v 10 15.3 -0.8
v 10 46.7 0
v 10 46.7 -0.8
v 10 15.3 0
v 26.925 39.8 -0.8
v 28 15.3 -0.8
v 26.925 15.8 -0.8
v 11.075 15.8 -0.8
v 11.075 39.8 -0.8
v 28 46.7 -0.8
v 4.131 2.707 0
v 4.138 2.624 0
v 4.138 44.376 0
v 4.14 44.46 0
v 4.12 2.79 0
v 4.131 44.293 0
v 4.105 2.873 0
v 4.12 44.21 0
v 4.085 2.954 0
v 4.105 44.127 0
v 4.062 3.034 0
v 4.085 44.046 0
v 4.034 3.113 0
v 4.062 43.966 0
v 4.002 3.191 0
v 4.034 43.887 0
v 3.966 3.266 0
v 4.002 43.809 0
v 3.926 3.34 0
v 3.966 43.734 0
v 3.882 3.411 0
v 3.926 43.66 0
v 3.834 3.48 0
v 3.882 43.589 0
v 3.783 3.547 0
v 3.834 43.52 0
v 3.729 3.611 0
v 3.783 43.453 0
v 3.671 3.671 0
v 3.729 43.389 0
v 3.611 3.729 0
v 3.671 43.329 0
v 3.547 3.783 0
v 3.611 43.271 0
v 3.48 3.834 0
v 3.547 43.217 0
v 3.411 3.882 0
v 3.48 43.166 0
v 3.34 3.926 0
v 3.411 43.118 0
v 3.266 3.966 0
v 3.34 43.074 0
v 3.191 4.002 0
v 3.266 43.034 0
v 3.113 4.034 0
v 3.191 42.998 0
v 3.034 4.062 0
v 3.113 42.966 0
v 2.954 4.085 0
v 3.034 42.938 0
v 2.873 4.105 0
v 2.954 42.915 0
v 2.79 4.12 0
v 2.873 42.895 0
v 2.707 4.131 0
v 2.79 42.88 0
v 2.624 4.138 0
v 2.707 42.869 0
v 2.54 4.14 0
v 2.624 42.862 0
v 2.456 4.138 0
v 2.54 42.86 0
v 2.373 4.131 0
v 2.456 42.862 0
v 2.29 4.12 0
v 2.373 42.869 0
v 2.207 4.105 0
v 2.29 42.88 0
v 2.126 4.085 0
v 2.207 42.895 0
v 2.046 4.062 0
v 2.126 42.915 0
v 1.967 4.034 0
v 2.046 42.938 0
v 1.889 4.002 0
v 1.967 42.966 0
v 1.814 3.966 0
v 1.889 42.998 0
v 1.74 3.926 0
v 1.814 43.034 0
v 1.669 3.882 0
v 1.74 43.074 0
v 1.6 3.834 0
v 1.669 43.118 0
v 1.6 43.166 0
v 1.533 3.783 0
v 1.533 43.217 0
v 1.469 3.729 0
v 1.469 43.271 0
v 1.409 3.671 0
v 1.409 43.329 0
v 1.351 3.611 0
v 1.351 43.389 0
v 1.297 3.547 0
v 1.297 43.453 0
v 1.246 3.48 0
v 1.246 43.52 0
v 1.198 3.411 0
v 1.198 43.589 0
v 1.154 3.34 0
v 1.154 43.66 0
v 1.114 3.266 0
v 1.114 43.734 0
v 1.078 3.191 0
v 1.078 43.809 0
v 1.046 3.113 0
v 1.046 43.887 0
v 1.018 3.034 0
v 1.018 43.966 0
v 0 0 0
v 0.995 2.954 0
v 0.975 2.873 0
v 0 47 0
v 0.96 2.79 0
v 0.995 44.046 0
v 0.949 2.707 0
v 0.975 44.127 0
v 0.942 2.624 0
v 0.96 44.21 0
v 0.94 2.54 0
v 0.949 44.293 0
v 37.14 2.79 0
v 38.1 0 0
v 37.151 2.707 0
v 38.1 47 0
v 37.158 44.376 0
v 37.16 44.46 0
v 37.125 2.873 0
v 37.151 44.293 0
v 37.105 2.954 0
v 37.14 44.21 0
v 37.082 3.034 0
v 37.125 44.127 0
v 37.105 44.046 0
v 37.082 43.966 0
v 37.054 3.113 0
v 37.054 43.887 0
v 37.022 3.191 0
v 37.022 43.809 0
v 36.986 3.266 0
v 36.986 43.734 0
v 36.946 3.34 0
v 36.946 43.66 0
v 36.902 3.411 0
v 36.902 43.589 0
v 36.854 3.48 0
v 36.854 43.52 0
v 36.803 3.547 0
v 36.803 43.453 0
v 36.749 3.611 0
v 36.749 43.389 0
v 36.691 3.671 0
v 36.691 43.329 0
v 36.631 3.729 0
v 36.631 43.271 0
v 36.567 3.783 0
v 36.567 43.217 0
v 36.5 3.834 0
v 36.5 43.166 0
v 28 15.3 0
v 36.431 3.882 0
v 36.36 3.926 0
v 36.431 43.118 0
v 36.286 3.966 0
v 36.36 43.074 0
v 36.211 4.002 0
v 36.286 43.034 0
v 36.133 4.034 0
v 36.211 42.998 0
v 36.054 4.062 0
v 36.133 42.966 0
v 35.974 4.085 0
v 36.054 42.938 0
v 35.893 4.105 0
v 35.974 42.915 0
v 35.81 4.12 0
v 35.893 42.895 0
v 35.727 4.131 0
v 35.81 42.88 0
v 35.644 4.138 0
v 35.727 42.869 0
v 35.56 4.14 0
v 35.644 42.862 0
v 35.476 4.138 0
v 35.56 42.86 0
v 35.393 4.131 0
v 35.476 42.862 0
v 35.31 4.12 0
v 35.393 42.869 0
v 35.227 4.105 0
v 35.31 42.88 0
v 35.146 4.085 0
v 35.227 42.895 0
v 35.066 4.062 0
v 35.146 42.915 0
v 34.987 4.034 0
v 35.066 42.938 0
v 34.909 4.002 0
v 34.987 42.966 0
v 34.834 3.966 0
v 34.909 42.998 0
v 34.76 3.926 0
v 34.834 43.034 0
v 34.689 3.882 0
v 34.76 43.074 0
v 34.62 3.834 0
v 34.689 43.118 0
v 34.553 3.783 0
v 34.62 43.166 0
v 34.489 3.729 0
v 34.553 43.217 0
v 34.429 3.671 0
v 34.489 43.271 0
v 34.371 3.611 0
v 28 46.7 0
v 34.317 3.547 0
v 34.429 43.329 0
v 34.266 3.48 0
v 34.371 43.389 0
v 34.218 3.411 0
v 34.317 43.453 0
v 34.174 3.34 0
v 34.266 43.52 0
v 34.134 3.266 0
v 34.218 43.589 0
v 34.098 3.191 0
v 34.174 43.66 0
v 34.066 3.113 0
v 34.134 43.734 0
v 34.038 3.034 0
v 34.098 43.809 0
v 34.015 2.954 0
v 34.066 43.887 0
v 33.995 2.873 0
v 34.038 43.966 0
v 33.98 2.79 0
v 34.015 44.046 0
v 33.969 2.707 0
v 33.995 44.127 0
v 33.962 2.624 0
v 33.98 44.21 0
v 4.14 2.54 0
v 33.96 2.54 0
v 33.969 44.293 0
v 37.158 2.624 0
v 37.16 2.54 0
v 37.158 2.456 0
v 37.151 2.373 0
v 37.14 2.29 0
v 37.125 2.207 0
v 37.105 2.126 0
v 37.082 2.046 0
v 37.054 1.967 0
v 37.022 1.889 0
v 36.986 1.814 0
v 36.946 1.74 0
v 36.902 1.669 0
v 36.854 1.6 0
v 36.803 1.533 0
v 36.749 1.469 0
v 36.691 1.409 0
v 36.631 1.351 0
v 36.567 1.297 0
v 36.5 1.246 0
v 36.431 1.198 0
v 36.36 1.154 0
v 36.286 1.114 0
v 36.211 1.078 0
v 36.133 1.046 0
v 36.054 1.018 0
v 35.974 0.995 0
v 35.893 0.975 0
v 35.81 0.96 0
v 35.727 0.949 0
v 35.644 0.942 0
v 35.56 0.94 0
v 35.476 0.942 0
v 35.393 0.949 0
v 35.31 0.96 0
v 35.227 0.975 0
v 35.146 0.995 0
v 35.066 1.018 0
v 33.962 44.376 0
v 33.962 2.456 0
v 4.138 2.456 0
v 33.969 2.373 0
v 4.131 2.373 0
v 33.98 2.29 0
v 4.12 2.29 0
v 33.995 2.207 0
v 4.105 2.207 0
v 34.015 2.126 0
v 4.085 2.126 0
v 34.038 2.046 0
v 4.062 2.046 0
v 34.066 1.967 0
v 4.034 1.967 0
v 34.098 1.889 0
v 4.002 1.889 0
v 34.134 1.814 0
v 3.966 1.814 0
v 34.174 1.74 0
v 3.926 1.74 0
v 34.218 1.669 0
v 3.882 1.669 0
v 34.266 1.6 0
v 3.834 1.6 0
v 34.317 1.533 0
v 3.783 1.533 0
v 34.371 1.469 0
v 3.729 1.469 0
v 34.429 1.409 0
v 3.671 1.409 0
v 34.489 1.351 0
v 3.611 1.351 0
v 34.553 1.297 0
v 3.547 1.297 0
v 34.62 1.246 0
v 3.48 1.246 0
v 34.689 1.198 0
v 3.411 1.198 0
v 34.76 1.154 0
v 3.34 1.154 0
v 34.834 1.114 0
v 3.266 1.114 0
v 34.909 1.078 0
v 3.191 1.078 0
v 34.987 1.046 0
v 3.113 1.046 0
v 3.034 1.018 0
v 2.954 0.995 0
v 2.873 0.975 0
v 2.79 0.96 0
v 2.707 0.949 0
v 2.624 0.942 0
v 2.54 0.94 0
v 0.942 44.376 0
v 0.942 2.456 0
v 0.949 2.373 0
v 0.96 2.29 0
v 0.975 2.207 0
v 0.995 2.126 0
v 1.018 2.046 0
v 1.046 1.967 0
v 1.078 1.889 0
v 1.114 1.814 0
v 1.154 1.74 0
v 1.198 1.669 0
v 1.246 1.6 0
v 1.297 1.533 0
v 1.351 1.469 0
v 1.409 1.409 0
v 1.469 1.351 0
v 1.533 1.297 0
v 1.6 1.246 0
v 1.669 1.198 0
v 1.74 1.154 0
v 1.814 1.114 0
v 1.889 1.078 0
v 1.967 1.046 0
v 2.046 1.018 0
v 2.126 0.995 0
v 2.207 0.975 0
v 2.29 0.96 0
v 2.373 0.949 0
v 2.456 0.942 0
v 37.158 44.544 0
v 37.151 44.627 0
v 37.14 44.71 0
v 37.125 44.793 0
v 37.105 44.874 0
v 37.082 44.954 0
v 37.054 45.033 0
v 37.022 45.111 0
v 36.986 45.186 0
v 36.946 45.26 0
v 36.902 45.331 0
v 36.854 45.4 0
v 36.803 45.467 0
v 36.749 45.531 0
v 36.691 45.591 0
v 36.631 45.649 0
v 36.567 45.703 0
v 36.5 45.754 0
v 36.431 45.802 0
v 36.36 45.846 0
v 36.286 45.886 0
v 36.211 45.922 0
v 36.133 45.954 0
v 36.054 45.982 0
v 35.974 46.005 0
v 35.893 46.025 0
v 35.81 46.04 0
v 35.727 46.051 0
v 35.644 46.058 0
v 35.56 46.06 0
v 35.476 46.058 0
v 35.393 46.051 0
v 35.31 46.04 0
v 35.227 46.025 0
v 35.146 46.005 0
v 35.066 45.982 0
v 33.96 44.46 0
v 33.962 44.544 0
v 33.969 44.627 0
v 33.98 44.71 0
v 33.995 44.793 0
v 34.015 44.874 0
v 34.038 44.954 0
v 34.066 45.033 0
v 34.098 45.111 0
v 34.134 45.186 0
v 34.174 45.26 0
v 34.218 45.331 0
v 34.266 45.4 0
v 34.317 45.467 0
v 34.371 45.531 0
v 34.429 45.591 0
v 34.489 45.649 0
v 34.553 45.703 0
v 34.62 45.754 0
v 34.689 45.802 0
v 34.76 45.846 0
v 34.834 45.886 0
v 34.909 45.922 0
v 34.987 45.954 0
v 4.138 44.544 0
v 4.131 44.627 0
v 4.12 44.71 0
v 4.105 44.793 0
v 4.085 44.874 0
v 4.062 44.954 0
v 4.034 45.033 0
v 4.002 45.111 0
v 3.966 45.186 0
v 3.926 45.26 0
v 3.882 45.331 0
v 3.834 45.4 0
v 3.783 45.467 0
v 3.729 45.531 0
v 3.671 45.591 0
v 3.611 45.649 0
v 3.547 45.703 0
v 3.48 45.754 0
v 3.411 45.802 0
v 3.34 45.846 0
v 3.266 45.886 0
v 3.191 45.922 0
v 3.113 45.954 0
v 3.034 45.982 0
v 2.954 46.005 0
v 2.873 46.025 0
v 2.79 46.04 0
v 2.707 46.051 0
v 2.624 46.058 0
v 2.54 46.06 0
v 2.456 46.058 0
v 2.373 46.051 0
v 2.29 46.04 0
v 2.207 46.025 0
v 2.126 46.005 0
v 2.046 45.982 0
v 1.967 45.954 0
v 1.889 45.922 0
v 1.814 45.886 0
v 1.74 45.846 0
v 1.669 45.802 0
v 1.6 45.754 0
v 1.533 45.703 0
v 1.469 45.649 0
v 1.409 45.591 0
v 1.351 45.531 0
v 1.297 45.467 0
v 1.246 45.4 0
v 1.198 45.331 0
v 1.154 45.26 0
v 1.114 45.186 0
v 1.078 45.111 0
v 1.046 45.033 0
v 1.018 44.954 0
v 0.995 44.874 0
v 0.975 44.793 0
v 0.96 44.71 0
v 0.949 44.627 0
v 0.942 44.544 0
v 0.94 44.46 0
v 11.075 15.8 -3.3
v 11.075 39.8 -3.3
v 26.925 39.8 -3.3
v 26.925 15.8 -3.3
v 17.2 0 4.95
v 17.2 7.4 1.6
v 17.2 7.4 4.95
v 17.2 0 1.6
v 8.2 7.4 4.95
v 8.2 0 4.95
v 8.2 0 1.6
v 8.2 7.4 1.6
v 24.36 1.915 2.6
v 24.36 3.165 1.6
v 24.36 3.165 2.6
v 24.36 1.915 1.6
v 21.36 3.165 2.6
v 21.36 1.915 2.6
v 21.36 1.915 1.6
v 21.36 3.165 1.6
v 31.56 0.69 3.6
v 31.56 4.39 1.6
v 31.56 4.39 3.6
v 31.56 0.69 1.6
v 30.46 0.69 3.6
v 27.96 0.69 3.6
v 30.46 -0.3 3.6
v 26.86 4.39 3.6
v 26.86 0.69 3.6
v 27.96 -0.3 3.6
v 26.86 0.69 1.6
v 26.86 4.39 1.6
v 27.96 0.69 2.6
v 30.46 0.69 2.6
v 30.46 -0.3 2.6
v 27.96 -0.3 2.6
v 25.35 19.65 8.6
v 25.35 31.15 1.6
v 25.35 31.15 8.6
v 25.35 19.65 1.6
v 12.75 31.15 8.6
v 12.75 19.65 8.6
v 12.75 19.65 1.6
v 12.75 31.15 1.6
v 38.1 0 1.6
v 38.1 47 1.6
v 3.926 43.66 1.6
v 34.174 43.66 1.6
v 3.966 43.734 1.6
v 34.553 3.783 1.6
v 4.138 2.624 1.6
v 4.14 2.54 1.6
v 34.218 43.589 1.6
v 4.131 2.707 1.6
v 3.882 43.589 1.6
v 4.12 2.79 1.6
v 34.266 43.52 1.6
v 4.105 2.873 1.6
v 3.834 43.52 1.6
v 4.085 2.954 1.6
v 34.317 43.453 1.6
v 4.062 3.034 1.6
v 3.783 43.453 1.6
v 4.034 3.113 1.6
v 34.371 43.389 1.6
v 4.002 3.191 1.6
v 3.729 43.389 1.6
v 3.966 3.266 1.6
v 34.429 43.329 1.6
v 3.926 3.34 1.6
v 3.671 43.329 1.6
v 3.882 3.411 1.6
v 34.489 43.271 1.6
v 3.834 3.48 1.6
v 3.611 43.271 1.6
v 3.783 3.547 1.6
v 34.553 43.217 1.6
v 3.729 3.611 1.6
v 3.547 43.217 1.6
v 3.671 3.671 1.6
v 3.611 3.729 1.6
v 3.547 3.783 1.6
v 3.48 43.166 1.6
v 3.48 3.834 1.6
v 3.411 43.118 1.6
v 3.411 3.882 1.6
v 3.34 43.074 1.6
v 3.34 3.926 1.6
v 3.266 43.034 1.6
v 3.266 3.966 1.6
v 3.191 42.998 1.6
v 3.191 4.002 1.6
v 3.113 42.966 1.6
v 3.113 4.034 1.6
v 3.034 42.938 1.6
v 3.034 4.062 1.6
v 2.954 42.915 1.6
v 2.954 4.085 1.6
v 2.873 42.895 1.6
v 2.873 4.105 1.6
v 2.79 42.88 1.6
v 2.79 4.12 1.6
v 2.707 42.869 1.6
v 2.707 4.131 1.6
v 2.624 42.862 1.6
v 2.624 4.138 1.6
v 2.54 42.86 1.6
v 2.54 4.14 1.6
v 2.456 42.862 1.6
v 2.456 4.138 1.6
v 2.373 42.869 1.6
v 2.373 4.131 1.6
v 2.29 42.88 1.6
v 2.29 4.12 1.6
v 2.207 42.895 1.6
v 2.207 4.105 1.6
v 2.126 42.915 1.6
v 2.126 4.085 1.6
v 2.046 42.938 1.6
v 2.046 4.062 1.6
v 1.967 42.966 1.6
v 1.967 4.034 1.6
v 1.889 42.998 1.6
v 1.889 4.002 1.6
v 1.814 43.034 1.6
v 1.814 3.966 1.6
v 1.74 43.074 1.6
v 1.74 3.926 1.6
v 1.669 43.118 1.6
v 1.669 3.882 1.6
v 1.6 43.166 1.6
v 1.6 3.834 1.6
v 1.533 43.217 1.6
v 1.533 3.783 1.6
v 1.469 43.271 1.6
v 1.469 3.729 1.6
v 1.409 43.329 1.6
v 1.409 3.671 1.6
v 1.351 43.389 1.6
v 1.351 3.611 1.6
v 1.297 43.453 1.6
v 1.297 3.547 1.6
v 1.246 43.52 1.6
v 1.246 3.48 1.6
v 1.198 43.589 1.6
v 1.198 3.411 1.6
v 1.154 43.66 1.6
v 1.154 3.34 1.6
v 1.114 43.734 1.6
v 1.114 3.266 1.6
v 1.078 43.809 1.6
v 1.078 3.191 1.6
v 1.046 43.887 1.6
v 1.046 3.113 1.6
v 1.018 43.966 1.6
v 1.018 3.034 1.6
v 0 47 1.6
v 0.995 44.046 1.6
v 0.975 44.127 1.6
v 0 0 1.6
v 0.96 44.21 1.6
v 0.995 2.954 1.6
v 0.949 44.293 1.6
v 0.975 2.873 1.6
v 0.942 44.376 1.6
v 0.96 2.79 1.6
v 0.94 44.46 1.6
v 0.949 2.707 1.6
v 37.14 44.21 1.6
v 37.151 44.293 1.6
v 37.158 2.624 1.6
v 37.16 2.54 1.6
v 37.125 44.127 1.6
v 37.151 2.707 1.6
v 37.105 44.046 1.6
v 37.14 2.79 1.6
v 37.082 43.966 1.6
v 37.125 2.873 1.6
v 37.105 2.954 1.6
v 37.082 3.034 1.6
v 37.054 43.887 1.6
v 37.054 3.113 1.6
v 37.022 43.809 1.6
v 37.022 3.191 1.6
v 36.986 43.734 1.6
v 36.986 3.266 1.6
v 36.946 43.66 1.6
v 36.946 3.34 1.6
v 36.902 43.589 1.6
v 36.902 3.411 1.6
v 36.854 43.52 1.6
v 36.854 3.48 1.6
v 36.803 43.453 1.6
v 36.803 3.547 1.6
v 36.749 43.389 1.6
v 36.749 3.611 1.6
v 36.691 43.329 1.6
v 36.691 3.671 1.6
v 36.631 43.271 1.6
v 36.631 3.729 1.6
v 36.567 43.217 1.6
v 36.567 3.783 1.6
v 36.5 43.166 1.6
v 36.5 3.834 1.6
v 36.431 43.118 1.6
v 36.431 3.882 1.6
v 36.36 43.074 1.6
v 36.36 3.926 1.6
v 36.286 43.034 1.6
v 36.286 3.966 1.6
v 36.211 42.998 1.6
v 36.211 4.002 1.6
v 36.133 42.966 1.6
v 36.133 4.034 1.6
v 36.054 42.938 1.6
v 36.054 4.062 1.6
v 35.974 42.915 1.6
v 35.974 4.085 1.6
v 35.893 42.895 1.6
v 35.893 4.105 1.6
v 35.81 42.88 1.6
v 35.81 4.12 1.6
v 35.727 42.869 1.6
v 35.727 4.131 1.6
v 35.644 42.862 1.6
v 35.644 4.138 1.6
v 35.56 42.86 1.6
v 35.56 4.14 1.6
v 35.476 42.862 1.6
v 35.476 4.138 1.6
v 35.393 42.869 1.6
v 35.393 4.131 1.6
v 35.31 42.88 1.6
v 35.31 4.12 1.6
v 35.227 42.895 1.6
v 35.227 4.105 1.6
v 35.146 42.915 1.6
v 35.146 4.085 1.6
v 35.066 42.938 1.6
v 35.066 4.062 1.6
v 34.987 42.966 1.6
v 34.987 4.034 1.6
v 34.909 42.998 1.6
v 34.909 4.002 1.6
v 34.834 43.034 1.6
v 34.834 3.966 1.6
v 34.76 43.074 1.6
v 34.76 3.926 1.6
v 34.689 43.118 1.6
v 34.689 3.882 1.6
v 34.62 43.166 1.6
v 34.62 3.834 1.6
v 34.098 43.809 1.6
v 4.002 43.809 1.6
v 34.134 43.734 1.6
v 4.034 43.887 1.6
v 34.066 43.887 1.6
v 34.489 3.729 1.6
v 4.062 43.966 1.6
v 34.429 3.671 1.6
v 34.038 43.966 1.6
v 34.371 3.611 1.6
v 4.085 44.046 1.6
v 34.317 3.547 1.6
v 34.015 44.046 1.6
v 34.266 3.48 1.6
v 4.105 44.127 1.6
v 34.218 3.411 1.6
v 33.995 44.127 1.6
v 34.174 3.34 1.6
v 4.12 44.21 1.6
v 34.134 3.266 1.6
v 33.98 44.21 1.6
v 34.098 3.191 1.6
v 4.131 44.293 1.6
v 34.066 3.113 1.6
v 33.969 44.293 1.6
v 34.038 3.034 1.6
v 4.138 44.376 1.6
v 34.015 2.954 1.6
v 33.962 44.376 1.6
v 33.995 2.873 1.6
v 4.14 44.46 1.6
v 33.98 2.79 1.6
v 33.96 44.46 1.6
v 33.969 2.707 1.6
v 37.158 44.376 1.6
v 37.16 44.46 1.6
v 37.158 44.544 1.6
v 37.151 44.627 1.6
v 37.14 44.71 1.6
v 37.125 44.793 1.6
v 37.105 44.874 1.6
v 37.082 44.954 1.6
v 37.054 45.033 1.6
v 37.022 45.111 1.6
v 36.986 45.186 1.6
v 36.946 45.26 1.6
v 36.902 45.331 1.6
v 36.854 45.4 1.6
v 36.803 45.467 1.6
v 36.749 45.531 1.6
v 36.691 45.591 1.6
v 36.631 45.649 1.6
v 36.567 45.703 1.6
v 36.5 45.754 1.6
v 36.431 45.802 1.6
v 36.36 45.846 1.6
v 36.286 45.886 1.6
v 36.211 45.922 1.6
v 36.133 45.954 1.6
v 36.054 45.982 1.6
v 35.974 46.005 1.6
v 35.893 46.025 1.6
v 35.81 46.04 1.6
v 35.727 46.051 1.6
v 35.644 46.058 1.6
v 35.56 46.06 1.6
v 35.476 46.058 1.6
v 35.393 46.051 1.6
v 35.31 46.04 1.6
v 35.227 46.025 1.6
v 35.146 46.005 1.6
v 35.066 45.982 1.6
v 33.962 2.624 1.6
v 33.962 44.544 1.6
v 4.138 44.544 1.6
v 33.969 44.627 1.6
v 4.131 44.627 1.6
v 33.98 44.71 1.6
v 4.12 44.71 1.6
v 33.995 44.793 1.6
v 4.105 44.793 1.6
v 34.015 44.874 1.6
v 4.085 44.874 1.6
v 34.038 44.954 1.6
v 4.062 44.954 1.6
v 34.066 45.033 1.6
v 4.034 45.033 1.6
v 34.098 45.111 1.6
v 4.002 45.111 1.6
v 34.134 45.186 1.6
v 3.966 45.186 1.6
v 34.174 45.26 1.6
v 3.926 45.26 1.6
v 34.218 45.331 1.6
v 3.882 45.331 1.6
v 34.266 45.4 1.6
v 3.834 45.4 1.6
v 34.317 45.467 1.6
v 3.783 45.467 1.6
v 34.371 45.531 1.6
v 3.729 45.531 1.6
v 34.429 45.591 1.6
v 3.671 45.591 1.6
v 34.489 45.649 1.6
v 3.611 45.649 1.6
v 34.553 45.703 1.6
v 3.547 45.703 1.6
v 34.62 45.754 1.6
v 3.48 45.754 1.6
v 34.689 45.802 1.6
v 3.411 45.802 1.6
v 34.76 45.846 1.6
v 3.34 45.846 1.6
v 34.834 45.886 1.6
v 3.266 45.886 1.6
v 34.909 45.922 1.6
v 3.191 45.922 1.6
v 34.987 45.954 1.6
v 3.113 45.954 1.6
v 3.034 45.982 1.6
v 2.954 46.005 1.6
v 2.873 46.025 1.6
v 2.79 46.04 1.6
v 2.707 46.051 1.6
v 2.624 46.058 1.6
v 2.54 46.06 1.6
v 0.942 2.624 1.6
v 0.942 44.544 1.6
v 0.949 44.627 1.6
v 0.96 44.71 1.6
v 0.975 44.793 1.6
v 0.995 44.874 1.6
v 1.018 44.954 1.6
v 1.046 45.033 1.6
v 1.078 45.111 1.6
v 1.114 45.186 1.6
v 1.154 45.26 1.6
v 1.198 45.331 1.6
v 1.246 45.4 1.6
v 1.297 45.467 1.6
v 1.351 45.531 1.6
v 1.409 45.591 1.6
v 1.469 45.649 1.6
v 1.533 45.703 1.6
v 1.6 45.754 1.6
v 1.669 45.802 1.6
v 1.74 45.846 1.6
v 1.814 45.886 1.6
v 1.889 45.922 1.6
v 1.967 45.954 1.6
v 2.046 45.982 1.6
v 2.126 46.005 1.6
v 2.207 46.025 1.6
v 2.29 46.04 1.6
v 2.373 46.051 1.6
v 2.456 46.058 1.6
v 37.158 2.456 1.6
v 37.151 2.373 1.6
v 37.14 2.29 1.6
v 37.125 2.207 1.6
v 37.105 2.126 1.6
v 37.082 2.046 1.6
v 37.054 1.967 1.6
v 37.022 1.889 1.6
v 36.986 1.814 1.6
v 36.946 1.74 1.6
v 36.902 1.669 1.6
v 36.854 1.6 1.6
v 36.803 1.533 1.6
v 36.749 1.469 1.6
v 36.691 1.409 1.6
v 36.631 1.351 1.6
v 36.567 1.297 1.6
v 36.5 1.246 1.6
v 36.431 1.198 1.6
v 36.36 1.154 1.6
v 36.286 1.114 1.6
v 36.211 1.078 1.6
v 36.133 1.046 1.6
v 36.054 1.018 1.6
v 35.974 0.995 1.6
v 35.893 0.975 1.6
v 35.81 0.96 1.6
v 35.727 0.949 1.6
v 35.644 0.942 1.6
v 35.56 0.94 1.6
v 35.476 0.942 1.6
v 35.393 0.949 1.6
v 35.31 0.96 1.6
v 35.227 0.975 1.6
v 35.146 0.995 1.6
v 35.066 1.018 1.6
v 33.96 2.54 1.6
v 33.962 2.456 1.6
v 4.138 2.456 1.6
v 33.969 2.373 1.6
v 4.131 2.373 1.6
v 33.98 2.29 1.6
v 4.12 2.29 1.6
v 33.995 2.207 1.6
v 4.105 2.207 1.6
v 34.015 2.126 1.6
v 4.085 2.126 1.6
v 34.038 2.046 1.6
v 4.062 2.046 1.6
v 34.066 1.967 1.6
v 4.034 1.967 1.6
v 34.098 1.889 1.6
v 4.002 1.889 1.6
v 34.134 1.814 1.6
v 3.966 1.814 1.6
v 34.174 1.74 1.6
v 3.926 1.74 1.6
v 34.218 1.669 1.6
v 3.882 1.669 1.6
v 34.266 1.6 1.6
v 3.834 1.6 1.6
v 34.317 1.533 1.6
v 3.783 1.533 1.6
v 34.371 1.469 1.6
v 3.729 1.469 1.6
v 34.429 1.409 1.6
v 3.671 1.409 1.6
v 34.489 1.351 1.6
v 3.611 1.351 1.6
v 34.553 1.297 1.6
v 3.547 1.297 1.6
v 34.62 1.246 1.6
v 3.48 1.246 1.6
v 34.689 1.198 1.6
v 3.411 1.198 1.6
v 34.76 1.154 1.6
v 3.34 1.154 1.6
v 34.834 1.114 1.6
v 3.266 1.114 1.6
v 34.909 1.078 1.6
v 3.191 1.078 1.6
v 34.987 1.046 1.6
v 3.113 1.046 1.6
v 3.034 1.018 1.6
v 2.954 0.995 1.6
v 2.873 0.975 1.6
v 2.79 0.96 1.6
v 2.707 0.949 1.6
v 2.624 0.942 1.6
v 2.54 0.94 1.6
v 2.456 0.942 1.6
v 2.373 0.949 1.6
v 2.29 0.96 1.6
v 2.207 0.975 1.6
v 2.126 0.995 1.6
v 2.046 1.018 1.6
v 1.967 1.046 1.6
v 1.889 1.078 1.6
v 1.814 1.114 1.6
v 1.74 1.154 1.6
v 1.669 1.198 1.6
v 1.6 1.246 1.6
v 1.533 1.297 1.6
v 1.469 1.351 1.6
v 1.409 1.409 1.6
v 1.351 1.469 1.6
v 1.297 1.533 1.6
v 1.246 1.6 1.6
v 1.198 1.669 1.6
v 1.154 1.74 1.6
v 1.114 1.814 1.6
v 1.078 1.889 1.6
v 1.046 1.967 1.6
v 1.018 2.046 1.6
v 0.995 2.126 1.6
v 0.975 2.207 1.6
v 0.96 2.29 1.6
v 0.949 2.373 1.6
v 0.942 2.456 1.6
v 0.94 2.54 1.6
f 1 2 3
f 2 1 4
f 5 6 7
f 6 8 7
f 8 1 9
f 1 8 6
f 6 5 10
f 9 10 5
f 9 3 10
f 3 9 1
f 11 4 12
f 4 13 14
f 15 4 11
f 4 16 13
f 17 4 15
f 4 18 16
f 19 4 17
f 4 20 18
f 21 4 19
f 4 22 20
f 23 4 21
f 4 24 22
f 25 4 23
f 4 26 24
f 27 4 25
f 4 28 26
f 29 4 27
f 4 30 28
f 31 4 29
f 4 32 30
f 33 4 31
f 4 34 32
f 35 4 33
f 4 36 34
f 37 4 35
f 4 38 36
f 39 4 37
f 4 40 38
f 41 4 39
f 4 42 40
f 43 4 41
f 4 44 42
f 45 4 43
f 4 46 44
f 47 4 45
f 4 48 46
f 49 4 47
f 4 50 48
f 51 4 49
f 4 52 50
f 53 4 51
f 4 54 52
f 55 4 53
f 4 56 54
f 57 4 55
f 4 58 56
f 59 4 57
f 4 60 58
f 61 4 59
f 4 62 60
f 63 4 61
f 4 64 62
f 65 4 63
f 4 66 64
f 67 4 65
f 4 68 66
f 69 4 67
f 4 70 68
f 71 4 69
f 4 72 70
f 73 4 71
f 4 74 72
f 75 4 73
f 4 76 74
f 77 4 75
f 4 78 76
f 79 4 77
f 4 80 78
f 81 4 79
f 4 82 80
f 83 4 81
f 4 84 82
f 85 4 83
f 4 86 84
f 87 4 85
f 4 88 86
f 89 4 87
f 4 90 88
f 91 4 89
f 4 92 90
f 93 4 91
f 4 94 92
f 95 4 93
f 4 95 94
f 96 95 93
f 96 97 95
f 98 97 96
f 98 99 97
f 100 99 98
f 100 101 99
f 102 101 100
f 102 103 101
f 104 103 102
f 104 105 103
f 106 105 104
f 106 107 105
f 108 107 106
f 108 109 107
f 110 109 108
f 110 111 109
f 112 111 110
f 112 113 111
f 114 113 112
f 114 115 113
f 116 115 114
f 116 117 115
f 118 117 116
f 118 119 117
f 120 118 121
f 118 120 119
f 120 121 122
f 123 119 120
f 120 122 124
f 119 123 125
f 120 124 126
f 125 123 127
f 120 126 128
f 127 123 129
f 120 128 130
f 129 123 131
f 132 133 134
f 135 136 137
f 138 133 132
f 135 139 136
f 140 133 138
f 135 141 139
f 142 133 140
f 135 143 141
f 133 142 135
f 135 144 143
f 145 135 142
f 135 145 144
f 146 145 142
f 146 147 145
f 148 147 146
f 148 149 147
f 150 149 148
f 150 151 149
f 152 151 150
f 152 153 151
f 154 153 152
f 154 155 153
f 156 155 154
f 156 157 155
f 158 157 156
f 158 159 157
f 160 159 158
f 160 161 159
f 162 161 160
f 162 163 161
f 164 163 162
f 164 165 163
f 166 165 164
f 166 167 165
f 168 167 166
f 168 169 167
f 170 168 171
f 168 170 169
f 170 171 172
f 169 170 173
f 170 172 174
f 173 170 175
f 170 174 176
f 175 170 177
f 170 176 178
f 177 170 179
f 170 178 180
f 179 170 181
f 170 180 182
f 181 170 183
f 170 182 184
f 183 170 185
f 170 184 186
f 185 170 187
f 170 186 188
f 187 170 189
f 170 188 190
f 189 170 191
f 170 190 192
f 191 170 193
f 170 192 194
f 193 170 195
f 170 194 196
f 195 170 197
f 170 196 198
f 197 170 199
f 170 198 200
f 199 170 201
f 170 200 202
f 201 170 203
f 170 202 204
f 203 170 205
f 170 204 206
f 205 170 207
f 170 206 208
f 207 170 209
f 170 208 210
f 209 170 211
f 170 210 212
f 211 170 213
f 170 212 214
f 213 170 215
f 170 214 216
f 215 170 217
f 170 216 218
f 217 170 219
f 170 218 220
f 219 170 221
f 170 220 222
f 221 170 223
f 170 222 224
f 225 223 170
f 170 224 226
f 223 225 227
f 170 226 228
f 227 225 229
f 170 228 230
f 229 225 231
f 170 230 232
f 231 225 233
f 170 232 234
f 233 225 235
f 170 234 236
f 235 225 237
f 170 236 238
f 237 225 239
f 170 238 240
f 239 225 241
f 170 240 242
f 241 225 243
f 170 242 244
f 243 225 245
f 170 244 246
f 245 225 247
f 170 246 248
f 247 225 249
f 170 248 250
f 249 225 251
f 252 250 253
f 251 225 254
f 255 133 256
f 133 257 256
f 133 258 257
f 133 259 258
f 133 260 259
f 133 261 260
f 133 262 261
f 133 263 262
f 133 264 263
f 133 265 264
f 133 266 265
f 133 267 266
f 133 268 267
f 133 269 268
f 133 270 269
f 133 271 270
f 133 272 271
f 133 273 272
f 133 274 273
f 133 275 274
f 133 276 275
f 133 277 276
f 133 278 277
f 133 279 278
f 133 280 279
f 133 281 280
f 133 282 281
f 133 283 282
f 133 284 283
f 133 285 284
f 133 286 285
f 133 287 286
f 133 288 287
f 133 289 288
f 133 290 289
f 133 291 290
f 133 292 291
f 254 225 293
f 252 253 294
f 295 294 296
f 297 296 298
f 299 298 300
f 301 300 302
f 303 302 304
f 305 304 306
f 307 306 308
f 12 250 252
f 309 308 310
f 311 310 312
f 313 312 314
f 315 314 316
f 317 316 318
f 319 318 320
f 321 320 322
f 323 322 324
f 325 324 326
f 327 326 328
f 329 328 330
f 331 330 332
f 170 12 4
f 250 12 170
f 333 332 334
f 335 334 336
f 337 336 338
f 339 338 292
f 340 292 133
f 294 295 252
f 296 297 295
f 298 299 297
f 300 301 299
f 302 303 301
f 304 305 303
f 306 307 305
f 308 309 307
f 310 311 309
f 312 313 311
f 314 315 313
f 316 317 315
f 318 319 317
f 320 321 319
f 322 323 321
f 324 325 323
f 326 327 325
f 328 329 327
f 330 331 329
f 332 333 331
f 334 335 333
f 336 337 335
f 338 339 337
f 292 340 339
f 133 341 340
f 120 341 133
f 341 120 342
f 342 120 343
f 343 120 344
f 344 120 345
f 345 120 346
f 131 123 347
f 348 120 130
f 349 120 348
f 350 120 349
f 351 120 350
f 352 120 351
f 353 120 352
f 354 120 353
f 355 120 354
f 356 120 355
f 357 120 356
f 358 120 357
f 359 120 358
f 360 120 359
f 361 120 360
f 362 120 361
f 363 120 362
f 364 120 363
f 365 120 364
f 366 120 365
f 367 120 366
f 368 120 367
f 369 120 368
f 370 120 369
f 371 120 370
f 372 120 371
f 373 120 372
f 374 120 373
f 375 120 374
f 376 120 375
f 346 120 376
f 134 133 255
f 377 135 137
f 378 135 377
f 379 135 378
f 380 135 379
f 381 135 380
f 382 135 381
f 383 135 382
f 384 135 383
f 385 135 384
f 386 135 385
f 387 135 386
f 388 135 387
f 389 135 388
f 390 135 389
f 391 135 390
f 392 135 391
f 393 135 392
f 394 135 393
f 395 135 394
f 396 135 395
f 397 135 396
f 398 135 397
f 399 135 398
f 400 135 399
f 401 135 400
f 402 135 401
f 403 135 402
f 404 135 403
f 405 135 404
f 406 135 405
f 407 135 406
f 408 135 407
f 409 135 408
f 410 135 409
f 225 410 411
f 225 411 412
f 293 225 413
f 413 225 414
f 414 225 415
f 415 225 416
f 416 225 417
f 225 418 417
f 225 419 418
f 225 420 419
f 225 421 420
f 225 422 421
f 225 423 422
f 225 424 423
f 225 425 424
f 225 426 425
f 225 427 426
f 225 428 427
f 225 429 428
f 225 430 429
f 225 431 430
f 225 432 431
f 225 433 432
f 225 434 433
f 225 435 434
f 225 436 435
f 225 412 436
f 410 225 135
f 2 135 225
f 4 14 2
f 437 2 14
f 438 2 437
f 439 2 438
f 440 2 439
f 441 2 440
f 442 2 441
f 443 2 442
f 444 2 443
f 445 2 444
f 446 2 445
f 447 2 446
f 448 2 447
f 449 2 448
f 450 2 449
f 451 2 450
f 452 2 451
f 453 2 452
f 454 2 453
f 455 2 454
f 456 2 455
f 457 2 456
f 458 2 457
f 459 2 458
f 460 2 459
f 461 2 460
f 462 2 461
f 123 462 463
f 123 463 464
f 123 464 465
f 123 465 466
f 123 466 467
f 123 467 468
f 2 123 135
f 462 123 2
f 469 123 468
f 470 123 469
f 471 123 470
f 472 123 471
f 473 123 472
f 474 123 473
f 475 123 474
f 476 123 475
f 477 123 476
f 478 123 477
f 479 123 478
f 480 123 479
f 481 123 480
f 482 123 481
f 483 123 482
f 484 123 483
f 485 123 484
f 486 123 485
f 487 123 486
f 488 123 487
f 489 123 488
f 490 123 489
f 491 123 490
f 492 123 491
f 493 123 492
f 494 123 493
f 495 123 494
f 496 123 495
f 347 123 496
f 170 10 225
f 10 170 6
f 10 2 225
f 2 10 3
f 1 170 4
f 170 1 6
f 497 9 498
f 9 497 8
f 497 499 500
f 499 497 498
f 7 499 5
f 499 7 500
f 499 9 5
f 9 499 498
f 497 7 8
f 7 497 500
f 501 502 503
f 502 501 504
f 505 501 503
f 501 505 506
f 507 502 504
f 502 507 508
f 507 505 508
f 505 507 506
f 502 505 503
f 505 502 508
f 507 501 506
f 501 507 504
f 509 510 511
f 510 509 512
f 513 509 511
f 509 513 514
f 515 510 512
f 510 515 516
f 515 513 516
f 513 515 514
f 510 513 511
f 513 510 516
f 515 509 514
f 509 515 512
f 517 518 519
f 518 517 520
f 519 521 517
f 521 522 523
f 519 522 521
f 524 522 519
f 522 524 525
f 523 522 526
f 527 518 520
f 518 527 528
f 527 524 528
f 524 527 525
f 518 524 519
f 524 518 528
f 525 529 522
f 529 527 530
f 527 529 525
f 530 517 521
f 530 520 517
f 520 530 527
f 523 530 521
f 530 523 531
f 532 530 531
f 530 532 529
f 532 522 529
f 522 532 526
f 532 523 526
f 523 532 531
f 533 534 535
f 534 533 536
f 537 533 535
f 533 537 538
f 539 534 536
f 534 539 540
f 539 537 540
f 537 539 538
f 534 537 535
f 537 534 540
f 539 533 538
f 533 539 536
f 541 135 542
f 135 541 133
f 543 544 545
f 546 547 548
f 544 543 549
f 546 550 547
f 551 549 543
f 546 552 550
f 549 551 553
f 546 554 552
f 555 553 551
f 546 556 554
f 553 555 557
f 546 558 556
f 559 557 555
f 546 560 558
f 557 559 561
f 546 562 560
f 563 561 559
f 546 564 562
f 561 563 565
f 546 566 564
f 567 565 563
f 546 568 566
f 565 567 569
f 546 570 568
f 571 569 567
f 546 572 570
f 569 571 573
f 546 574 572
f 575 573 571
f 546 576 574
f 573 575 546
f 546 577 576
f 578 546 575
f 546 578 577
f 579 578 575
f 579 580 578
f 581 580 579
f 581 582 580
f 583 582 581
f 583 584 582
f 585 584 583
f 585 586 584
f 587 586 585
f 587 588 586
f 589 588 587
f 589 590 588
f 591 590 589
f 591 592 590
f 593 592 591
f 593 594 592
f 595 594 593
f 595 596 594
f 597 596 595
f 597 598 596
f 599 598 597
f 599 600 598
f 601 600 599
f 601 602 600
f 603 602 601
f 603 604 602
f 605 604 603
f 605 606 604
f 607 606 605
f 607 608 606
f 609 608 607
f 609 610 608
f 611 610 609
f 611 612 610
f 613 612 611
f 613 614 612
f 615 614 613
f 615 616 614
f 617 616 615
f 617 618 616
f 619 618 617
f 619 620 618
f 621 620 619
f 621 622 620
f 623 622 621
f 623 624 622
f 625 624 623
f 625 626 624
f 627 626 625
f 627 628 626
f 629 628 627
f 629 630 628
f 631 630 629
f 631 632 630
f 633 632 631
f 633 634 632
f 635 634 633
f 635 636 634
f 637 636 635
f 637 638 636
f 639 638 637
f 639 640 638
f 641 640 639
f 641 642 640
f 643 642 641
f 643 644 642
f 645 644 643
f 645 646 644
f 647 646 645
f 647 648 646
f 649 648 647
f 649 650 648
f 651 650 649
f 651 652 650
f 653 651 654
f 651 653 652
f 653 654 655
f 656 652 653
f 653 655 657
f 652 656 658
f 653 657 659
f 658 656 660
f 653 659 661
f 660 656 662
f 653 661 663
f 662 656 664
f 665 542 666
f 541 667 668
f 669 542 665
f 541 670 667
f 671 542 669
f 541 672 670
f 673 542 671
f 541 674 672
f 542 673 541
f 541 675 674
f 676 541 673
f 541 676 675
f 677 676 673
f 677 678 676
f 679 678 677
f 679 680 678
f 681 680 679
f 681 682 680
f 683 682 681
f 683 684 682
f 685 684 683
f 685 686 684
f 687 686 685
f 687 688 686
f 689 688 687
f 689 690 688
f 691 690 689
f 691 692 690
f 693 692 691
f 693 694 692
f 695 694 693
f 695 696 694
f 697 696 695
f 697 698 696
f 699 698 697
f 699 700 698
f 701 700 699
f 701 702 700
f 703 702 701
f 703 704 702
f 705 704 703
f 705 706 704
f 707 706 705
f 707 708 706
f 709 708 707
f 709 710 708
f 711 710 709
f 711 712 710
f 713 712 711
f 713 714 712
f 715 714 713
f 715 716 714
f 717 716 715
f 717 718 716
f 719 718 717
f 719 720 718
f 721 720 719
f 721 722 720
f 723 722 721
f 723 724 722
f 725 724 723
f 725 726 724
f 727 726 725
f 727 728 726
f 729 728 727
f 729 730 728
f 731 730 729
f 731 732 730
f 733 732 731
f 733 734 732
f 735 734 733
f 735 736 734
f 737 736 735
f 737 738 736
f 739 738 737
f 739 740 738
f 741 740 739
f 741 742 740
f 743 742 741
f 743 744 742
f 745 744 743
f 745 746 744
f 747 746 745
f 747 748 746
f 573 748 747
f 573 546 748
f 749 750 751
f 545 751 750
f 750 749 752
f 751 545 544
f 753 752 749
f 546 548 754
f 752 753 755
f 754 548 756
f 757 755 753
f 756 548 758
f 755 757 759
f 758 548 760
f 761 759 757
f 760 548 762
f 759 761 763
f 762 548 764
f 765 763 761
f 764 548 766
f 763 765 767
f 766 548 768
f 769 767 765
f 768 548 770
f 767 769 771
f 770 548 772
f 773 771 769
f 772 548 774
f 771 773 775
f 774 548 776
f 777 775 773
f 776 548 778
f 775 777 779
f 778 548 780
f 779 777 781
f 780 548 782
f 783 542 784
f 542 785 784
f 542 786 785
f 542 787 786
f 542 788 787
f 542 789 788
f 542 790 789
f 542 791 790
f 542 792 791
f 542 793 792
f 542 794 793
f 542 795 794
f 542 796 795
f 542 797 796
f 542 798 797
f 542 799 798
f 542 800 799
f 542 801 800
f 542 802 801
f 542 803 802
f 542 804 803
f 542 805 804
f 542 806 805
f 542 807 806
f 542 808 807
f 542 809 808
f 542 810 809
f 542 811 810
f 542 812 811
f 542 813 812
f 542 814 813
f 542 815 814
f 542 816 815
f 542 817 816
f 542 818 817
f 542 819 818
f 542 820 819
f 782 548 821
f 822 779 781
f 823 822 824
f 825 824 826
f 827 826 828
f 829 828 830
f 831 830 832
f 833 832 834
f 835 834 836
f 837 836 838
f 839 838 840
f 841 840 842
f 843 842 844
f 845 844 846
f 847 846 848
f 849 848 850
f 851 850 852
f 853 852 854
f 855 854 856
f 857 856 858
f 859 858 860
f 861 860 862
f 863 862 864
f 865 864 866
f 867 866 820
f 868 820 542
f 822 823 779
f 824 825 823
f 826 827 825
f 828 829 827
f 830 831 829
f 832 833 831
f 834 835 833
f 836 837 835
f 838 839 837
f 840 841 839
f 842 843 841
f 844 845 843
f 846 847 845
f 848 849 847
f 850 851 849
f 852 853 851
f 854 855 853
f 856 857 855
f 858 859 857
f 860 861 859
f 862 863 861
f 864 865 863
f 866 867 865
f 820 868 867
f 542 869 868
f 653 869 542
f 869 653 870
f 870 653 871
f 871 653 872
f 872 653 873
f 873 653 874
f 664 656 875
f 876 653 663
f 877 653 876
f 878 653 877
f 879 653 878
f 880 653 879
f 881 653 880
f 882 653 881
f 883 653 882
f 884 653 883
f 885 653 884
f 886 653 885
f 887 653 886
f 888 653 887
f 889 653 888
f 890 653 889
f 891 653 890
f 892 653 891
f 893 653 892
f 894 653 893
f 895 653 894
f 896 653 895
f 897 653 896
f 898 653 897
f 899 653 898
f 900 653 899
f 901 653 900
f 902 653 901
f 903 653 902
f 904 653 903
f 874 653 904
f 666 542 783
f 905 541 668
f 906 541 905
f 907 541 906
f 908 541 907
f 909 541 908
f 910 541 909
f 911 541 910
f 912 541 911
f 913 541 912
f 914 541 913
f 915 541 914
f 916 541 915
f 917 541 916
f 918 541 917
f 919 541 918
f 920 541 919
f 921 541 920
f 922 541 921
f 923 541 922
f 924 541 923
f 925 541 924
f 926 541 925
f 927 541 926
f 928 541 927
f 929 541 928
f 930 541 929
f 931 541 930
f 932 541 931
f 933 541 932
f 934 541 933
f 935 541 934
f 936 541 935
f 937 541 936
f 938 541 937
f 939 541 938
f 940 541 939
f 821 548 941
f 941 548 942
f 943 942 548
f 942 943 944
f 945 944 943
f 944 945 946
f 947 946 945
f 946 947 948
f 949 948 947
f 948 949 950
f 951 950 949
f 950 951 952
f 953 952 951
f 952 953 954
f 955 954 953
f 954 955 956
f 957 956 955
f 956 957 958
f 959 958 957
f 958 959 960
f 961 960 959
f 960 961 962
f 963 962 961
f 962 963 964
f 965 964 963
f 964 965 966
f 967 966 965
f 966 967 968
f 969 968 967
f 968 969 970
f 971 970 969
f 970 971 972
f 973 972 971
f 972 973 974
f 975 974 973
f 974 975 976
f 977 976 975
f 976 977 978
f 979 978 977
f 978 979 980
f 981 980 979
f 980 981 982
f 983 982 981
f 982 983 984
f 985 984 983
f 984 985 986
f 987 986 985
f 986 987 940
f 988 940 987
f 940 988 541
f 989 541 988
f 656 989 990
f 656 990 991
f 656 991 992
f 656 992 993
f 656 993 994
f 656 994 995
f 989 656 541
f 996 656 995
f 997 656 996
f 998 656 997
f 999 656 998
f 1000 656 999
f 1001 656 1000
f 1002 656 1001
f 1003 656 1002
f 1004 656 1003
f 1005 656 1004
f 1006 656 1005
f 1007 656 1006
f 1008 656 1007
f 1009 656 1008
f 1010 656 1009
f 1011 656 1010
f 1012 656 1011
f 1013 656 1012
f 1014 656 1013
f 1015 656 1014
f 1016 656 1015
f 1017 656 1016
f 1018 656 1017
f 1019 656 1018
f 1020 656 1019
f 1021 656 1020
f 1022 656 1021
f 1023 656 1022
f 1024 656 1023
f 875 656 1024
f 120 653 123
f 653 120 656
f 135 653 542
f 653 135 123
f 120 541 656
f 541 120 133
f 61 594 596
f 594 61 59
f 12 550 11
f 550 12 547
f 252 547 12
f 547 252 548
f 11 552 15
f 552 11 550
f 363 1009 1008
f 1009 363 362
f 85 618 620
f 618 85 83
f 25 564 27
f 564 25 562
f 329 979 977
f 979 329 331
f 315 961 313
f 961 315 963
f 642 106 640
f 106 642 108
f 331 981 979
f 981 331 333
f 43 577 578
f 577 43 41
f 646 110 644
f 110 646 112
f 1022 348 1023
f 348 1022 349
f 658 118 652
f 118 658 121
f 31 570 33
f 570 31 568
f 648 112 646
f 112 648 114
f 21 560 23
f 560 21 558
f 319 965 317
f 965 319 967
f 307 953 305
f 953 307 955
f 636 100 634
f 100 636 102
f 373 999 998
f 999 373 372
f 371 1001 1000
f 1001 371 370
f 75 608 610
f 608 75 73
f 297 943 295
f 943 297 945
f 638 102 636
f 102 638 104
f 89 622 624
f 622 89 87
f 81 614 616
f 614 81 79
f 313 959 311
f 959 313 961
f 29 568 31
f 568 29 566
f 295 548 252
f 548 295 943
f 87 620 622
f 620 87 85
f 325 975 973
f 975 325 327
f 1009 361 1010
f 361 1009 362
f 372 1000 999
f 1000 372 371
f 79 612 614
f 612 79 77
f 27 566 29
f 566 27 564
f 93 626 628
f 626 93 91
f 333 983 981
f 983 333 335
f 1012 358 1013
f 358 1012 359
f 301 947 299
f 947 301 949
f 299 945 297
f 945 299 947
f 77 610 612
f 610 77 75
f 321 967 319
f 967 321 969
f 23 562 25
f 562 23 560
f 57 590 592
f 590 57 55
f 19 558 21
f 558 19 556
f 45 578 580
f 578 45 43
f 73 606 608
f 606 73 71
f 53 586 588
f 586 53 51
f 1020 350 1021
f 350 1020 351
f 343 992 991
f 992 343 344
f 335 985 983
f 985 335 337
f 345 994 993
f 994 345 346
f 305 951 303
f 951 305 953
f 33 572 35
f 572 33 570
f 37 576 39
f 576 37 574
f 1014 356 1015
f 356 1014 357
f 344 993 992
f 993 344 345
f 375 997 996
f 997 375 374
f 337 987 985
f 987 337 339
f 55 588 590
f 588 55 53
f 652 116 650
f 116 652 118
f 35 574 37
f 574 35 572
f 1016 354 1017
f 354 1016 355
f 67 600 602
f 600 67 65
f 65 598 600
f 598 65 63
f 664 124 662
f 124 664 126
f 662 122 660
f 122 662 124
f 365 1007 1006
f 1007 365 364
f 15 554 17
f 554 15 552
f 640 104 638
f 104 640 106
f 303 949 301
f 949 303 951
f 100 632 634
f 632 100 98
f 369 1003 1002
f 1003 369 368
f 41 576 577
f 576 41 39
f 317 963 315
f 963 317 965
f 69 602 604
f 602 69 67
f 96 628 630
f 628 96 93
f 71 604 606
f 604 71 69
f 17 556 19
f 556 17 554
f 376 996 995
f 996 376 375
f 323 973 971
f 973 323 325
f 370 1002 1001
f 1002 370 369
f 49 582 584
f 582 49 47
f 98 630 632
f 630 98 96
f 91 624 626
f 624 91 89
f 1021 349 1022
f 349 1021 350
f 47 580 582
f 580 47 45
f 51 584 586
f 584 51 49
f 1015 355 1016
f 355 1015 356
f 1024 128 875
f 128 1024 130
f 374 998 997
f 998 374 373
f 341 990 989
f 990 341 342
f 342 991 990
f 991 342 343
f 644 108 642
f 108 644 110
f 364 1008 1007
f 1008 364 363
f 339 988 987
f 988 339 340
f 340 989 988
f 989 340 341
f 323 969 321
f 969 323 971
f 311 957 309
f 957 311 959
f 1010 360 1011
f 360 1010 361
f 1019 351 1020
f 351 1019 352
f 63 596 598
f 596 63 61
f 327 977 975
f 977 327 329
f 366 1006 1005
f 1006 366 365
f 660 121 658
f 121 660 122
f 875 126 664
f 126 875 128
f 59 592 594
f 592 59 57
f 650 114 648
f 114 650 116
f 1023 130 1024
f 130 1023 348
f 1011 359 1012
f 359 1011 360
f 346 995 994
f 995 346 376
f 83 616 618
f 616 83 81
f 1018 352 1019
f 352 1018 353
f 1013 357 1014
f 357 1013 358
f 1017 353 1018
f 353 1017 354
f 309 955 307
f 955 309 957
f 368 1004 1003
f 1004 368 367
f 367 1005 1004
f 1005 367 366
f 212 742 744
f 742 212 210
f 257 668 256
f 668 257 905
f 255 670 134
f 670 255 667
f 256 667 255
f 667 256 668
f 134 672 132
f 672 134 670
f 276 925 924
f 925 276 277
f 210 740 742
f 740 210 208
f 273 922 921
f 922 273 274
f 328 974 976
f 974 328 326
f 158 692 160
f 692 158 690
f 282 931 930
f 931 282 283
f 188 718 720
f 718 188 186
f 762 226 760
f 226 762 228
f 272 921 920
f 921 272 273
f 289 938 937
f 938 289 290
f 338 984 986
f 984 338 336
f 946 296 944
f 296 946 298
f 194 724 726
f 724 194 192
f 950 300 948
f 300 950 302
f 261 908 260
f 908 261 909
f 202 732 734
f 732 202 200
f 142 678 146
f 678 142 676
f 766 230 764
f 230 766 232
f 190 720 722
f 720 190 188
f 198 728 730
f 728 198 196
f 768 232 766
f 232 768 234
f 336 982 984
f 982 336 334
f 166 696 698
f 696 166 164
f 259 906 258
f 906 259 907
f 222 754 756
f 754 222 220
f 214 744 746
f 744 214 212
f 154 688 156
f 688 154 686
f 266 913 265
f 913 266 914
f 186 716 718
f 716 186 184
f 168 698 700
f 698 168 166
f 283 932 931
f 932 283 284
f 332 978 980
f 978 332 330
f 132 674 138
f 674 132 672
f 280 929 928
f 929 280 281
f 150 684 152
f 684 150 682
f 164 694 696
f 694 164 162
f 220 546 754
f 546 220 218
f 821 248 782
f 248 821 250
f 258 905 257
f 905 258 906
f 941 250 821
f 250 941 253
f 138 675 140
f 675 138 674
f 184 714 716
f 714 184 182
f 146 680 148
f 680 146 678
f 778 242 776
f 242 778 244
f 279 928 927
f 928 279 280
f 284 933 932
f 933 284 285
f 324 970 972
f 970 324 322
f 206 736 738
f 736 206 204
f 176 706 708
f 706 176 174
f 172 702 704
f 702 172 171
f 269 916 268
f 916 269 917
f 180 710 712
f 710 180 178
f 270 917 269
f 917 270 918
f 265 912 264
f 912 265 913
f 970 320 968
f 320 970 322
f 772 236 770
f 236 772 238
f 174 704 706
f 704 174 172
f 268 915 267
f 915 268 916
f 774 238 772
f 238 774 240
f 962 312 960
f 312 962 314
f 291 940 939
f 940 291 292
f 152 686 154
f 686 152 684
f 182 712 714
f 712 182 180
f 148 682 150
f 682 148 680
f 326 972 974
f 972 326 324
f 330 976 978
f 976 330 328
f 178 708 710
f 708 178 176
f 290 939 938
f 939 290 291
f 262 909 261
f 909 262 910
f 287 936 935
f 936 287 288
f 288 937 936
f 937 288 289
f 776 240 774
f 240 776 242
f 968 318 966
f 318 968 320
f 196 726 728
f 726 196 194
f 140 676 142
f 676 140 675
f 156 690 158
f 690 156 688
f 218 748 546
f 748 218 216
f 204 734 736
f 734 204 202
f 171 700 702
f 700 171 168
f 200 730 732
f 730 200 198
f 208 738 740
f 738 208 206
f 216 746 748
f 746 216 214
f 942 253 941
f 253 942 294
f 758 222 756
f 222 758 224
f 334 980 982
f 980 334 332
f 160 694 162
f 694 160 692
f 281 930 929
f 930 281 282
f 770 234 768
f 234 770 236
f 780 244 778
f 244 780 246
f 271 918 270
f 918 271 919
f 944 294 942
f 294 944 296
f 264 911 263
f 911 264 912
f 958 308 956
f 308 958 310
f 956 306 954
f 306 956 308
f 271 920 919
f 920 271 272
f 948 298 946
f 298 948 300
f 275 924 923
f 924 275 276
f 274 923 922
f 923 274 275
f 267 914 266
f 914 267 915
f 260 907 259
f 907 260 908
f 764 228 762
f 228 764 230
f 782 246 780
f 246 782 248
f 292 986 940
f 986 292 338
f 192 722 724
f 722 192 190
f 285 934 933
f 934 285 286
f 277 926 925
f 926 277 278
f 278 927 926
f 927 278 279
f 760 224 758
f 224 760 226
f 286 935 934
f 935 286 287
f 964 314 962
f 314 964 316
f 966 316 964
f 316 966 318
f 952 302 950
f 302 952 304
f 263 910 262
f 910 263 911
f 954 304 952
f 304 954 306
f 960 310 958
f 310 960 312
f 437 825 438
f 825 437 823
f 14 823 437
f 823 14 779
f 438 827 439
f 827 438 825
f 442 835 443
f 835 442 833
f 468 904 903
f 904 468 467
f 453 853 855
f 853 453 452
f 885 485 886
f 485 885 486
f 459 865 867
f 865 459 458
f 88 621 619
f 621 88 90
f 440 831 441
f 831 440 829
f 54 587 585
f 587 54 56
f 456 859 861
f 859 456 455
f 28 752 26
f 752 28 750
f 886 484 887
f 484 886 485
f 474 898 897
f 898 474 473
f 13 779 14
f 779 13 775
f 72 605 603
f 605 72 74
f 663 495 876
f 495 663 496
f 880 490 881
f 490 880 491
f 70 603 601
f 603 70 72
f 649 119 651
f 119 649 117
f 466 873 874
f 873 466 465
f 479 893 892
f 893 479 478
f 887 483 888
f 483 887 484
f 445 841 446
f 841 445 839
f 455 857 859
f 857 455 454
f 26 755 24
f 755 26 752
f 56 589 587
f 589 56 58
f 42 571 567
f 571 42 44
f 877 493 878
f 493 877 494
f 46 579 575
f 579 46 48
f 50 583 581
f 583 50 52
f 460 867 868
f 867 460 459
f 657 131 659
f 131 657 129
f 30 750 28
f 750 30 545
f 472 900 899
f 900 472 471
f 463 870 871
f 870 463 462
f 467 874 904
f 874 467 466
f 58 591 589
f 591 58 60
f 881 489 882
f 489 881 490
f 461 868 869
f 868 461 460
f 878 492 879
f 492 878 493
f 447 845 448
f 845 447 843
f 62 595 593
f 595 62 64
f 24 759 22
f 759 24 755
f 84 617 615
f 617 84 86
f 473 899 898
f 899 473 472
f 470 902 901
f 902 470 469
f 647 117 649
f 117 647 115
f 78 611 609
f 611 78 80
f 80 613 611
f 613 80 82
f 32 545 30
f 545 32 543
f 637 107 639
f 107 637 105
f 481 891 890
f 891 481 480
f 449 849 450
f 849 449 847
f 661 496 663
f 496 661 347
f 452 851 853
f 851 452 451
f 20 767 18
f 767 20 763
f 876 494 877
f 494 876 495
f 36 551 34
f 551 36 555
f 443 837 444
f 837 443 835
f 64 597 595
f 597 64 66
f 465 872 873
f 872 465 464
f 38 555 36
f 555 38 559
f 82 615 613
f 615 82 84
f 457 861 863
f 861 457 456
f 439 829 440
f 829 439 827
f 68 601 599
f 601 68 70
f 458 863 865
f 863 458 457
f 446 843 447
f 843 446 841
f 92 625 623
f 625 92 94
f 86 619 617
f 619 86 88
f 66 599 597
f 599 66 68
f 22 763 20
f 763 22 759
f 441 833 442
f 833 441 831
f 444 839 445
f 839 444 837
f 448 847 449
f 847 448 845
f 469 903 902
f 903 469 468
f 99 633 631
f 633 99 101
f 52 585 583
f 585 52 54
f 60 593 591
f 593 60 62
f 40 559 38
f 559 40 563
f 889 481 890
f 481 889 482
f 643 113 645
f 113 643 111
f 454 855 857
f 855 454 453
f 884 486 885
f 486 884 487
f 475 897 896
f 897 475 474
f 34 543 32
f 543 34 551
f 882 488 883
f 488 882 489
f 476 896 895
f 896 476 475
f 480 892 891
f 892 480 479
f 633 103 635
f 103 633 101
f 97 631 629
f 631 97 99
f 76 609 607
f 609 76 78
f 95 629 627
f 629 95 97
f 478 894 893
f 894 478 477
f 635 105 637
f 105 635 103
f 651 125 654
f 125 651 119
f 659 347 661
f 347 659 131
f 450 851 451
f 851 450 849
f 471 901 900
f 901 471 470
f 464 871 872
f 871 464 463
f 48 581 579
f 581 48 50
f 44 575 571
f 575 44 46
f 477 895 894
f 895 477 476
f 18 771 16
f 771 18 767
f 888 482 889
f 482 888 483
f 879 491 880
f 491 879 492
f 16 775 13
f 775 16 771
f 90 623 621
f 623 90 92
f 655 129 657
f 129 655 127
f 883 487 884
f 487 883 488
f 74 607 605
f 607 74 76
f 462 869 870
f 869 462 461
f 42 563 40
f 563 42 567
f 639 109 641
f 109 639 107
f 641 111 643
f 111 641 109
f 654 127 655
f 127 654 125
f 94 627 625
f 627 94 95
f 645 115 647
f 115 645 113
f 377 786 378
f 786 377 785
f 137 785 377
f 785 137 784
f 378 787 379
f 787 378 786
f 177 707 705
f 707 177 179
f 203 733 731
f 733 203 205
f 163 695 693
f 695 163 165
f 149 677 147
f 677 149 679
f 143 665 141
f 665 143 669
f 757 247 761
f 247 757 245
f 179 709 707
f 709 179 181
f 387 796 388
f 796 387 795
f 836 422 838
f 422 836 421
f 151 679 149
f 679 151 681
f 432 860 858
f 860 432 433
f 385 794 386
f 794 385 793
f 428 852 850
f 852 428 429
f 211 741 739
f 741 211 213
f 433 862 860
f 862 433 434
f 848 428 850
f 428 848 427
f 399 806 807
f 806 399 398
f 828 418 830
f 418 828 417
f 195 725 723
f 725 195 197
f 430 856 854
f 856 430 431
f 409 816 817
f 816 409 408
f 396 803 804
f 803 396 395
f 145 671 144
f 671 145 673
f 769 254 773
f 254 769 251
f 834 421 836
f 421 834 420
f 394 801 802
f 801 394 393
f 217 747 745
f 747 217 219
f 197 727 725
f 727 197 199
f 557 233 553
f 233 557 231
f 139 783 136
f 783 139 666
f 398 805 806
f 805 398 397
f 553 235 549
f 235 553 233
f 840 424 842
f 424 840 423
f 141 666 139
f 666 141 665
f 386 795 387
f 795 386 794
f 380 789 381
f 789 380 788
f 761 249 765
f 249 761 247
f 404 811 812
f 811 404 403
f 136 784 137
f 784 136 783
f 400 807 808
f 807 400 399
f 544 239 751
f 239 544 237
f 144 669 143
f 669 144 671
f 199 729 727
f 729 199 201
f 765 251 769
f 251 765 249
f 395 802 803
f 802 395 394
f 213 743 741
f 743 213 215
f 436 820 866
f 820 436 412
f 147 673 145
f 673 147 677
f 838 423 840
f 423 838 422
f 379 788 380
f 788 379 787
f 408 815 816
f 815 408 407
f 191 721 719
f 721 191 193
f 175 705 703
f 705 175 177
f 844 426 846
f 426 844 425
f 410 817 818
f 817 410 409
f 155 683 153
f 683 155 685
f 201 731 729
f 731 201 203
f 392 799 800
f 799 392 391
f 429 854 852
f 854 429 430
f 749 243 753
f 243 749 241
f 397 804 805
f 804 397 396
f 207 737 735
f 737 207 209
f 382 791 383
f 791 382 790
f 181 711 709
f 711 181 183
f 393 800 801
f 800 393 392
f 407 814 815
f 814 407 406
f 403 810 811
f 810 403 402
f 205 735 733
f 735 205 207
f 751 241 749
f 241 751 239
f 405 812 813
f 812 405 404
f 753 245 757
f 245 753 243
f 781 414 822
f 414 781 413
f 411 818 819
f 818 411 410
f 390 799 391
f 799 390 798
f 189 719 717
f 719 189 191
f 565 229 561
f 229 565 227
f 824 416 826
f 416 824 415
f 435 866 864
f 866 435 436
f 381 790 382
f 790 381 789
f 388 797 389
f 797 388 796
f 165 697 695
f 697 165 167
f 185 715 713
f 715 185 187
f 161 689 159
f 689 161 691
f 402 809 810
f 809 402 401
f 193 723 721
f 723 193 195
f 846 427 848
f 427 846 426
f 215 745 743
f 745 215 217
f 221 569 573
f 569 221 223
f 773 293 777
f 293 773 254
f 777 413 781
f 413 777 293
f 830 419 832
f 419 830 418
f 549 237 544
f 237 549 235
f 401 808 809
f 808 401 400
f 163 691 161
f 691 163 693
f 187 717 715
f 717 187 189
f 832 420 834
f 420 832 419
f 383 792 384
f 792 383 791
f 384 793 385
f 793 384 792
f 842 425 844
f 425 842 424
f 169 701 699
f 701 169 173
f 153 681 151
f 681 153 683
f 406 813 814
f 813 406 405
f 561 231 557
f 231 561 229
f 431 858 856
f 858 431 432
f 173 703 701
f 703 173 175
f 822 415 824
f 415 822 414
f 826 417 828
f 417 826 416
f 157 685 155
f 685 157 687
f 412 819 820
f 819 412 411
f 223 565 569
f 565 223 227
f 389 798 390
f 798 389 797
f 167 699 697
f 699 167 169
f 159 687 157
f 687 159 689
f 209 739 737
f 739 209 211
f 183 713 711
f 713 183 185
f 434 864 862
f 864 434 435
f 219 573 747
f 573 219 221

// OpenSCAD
//
// tCam-Mini Rev 4 PCB
//

module esp32() {
    // PCB Base
    cube([18, 31.4, 0.8]);
    
    // Metal can
    translate([1.075, 0.5, 0.8]) {
        cube([15.85, 24, 2.5]);
    }
}


module tCamMini() {
    difference() {
        union() {
            // PCB
            cube([38.1, 47, 1.6]);
        
            // ESP32
            translate([10 + 18, 15.3, 0]) {
                rotate([0, 180, 0]) {
                    esp32();
                }
            }
            
            // Parts on top
            translate([0, 0, 1.6]) {
                // USB Connector
                translate([8.2, 0, 0]) {
                    cube([9, 7.4, 3.35]);
                }
                
                // LED
                translate([21.36, 1.915, 0]) {
                    cube([3, 1.25, 1]);
                }
                
                // Button
                translate([26.86, 0.69, 0]) {
                    cube([4.7, 3.7, 2]);
                }
                // Button stem
                translate([27.96, -0.3, 1]) {
                    cube([2.5, 1.4, 1]);
                }
                
                // Lepton
                translate([19.05 - 12.6/2, 25.4 - 11.5/2, 0]) {
                    cube([12.6, 11.5, 7]);
                }
            }
        }
        
        // Mounting holes
        translate([2.54, 2.54, -1]) {
            cylinder(h=3.6, r=1.6, $fn=120);
        }
        
        translate([35.56, 2.54, -1]) {
            cylinder(h=3.6, r=1.6, $fn=120);
        }
        
        translate([2.54, 44.46, -1]) {
            cylinder(h=3.6, r=1.6, $fn=120);
        }
        
        translate([35.56, 44.46, -1]) {
            cylinder(h=3.6, r=1.6, $fn=120);
        }
    }
}

tCamMini();
